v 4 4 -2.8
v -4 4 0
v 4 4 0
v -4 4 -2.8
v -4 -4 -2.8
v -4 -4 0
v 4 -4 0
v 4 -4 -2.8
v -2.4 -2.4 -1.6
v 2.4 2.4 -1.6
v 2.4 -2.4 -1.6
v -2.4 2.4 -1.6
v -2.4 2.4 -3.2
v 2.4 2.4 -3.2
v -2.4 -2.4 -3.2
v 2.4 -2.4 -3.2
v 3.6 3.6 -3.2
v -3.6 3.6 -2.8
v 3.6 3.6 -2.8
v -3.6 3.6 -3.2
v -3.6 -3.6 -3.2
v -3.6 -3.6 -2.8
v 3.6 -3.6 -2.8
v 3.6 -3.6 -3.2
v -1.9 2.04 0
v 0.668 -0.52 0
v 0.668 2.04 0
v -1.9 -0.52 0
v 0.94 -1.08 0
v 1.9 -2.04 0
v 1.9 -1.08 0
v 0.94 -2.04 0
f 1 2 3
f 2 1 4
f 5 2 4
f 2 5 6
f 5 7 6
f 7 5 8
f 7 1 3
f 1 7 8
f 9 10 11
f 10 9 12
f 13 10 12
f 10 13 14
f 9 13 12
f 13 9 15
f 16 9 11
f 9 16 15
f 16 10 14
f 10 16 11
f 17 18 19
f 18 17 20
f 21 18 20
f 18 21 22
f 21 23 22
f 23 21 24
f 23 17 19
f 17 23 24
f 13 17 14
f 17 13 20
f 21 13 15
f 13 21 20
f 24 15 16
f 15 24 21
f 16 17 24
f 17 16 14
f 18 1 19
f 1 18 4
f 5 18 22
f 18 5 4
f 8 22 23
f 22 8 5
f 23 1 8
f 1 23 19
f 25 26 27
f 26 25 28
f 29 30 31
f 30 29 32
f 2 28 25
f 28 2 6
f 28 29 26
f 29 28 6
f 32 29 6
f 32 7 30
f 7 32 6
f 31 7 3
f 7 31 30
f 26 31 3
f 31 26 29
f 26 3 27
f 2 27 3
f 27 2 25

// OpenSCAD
// file: ../p/box5.scad
use <../lib.scad>
function ldraw_lib__box5() = [
// 0 Box with 5 Faces and All Edges
// 0 Name: box5.dat
// 0 Author: James Jessiman
// 0 !LDRAW_ORG Primitive UPDATE 2012-01
// 0 !LICENSE Licensed under CC BY 2.0 and CC BY 4.0 : see CAreadme.txt
// 
// 0 BFC CERTIFY CCW
  [0,"BFC","CERTIFY"],
  [0,"BFC","CCW"],
// 
// 0 !HISTORY 2002-04-03 [sbliss] Modified for BFC compliance
// 0 !HISTORY 2002-04-25 [PTadmin] Official Update 2002-02
// 0 !HISTORY 2007-06-24 [PTadmin] Header formatted for Contributor Agreement
// 0 !HISTORY 2008-07-01 [PTadmin] Official Update 2008-01
// 0 !HISTORY 2012-02-16 [Philo] Changed to CCW
// 0 !HISTORY 2012-03-30 [PTadmin] Official Update 2012-01
// 
// 
// 2 24 1 1 1 -1 1 1
  [2,24,1,1,1,-1,1,1],
// 2 24 -1 1 1 -1 1 -1
  [2,24,-1,1,1,-1,1,-1],
// 2 24 -1 1 -1 1 1 -1
  [2,24,-1,1,-1,1,1,-1],
// 2 24 1 1 -1 1 1 1
  [2,24,1,1,-1,1,1,1],
// 2 24 1 0 1 -1 0 1
  [2,24,1,0,1,-1,0,1],
// 2 24 -1 0 1 -1 0 -1
  [2,24,-1,0,1,-1,0,-1],
// 2 24 -1 0 -1 1 0 -1
  [2,24,-1,0,-1,1,0,-1],
// 2 24 1 0 -1 1 0 1
  [2,24,1,0,-1,1,0,1],
// 2 24 1 0 1 1 1 1
  [2,24,1,0,1,1,1,1],
// 2 24 -1 0 1 -1 1 1
  [2,24,-1,0,1,-1,1,1],
// 2 24 1 0 -1 1 1 -1
  [2,24,1,0,-1,1,1,-1],
// 2 24 -1 0 -1 -1 1 -1
  [2,24,-1,0,-1,-1,1,-1],
// 4 16 -1 1 1 1 1 1 1 1 -1 -1 1 -1
  [4,16,-1,1,1,1,1,1,1,1,-1,-1,1,-1],
// 4 16 -1 1 1 -1 0 1 1 0 1 1 1 1
  [4,16,-1,1,1,-1,0,1,1,0,1,1,1,1],
// 4 16 -1 1 -1 -1 0 -1 -1 0 1 -1 1 1
  [4,16,-1,1,-1,-1,0,-1,-1,0,1,-1,1,1],
// 4 16 1 1 -1 1 0 -1 -1 0 -1 -1 1 -1
  [4,16,1,1,-1,1,0,-1,-1,0,-1,-1,1,-1],
// 4 16 1 1 1 1 0 1 1 0 -1 1 1 -1
  [4,16,1,1,1,1,0,1,1,0,-1,1,1,-1],
];
module ldraw_lib__box5(step=0, col=false, unit=2/5, alt=false, line=0.2, solid=!$preview)
    makepoly(ldraw_lib__box5(), step=step, col=col, unit=unit, alt=alt, line=line, solid=solid);
ldraw_lib__box5(line=0.2);
// file: ../p/box4.scad
use <../lib.scad>
function ldraw_lib__box4() = [
// 0 Box with 4 Faces (2 Parallel Pairs) and All Edges
// 0 Name: box4.dat
// 0 Author: James Jessiman
// 0 !LDRAW_ORG Primitive UPDATE 2012-01
// 0 !LICENSE Licensed under CC BY 2.0 and CC BY 4.0 : see CAreadme.txt
// 
// 0 BFC CERTIFY CCW
  [0,"BFC","CERTIFY"],
  [0,"BFC","CCW"],
// 
// 0 !HISTORY 2002-04-03 [sbliss] Modified for BFC compliance
// 0 !HISTORY 2002-04-25 [PTadmin] Official Update 2002-02
// 0 !HISTORY 2007-06-24 [PTadmin] Header formatted for Contributor Agreement
// 0 !HISTORY 2008-07-01 [PTadmin] Official Update 2008-01
// 0 !HISTORY 2012-02-16 [Philo] Changed to CCW
// 0 !HISTORY 2012-03-30 [PTadmin] Official Update 2012-01
// 
// 
// 2 24 1 1 1 -1 1 1
  [2,24,1,1,1,-1,1,1],
// 2 24 -1 1 1 -1 1 -1
  [2,24,-1,1,1,-1,1,-1],
// 2 24 -1 1 -1 1 1 -1
  [2,24,-1,1,-1,1,1,-1],
// 2 24 1 1 -1 1 1 1
  [2,24,1,1,-1,1,1,1],
// 2 24 1 0 1 -1 0 1
  [2,24,1,0,1,-1,0,1],
// 2 24 -1 0 1 -1 0 -1
  [2,24,-1,0,1,-1,0,-1],
// 2 24 -1 0 -1 1 0 -1
  [2,24,-1,0,-1,1,0,-1],
// 2 24 1 0 -1 1 0 1
  [2,24,1,0,-1,1,0,1],
// 2 24 1 0 1 1 1 1
  [2,24,1,0,1,1,1,1],
// 2 24 -1 0 1 -1 1 1
  [2,24,-1,0,1,-1,1,1],
// 2 24 1 0 -1 1 1 -1
  [2,24,1,0,-1,1,1,-1],
// 2 24 -1 0 -1 -1 1 -1
  [2,24,-1,0,-1,-1,1,-1],
// 4 16 -1 1 1 -1 0 1 1 0 1 1 1 1
  [4,16,-1,1,1,-1,0,1,1,0,1,1,1,1],
// 4 16 -1 1 -1 -1 0 -1 -1 0 1 -1 1 1
  [4,16,-1,1,-1,-1,0,-1,-1,0,1,-1,1,1],
// 4 16 1 1 -1 1 0 -1 -1 0 -1 -1 1 -1
  [4,16,1,1,-1,1,0,-1,-1,0,-1,-1,1,-1],
// 4 16 1 1 1 1 0 1 1 0 -1 1 1 -1
  [4,16,1,1,1,1,0,1,1,0,-1,1,1,-1],
];
module ldraw_lib__box4(step=0, col=false, unit=2/5, alt=false, line=0.2, solid=!$preview)
    makepoly(ldraw_lib__box4(), step=step, col=col, unit=unit, alt=alt, line=line, solid=solid);
ldraw_lib__box4(line=0.2);
// file: s/3070bs01.scad
use <../../lib.scad>
use <../../p/box4.scad>
use <../../p/box5.scad>
function ldraw_lib__s__3070bs01() = [
// 0 ~Tile  1 x  1 with Groove without Top Face
// 0 Name: s\3070bs01.dat
// 0 Author: Chris Dee [cwdee]
// 0 !LDRAW_ORG Subpart UPDATE 2009-02
// 0 !LICENSE Licensed under CC BY 2.0 and CC BY 4.0 : see CAreadme.txt
// 
// 0 BFC CERTIFY CCW
  [0,"BFC","CERTIFY"],
  [0,"BFC","CCW"],
// 
// 0 !HISTORY 2009-09-03 [PTadmin] Official Update 2009-02
// 
// 
// 1 16 0 0 0 10 0 0 0 7 0 0 0 10 box4.dat
  [1,16,0,0,0,10,0,0,0,7,0,0,0,10, ldraw_lib__box4()],
// 0 BFC INVERTNEXT
  [0,"BFC","INVERTNEXT"],
// 1 16 0 8 0 6 0 0 0 -4 0 0 0 6 box5.dat
  [1,16,0,8,0,6,0,0,0,-4,0,0,0,6, ldraw_lib__box5()],
// 1 16 0 7 0 9 0 0 0 1 0 0 0 9 box4.dat
  [1,16,0,7,0,9,0,0,0,1,0,0,0,9, ldraw_lib__box4()],
// 
// 4 16 9 8 9 6 8 6 -6 8 6 -9 8 9
  [4,16,9,8,9,6,8,6,-6,8,6,-9,8,9],
// 4 16 -9 8 9 -6 8 6 -6 8 -6 -9 8 -9
  [4,16,-9,8,9,-6,8,6,-6,8,-6,-9,8,-9],
// 4 16 -9 8 -9 -6 8 -6 6 8 -6 9 8 -9
  [4,16,-9,8,-9,-6,8,-6,6,8,-6,9,8,-9],
// 4 16 9 8 -9 6 8 -6 6 8 6 9 8 9
  [4,16,9,8,-9,6,8,-6,6,8,6,9,8,9],
// 
// 4 16 10 7 10 9 7 9 -9 7 9 -10 7 10
  [4,16,10,7,10,9,7,9,-9,7,9,-10,7,10],
// 4 16 -10 7 10 -9 7 9 -9 7 -9 -10 7 -10
  [4,16,-10,7,10,-9,7,9,-9,7,-9,-10,7,-10],
// 4 16 -10 7 -10 -9 7 -9 9 7 -9 10 7 -10
  [4,16,-10,7,-10,-9,7,-9,9,7,-9,10,7,-10],
// 4 16 10 7 -10 9 7 -9 9 7 9 10 7 10
  [4,16,10,7,-10,9,7,-9,9,7,9,10,7,10],
// 0
];
module ldraw_lib__s__3070bs01(step=0, col=false, unit=2/5, alt=false, line=0.2, solid=!$preview)
    makepoly(ldraw_lib__s__3070bs01(), step=step, col=col, unit=unit, alt=alt, line=line, solid=solid);
ldraw_lib__s__3070bs01(line=0.2);
// main file
use <../lib.scad>
use <s/3070bs01.scad>
function ldraw_lib__3070bpz0() = [
// 0 Tile  1 x  1 with Two White Squares Pattern
// 0 Name: 3070bpz0.dat
// 0 Author: Vincent Messenet [Cheenzo]
// 0 !LDRAW_ORG Part UPDATE 2019-02
// 0 !LICENSE Licensed under CC BY 2.0 and CC BY 4.0 : see CAreadme.txt
// 
// 0 BFC CERTIFY CCW
  [0,"BFC","CERTIFY"],
  [0,"BFC","CCW"],
// 
// 0 !KEYWORDS Brickheadz, BrickLink 3070bpb126, Minecraft, Set 41612
// 
// 0 !HISTORY 2019-09-09 [PTadmin] Official Update 2019-02
// 
// 
// 1 16 0 0 0 1 0 0 0 1 0 0 0 1 s\3070bs01.dat
  [1,16,0,0,0,1,0,0,0,1,0,0,0,1, ldraw_lib__s__3070bs01()],
// 
// 4 15 -4.75 0 5.1 -4.75 0 -1.3 1.67 0 -1.3 1.67 0 5.1
  [4,15,-4.75,0,5.1,-4.75,0,-1.3,1.67,0,-1.3,1.67,0,5.1],
// 4 15 2.35 0 -2.7 2.35 0 -5.1 4.75 0 -5.1 4.75 0 -2.7
  [4,15,2.35,0,-2.7,2.35,0,-5.1,4.75,0,-5.1,4.75,0,-2.7],
// 
// 4 16 -4.75 0 -1.3 -4.75 0 5.1 -10 0 10 -10 0 -10
  [4,16,-4.75,0,-1.3,-4.75,0,5.1,-10,0,10,-10,0,-10],
// 4 16 1.67 0 -1.3 -4.75 0 -1.3 -10 0 -10 2.35 0 -2.7
  [4,16,1.67,0,-1.3,-4.75,0,-1.3,-10,0,-10,2.35,0,-2.7],
// 3 16 2.35 0 -5.1 2.35 0 -2.7 -10 0 -10
  [3,16,2.35,0,-5.1,2.35,0,-2.7,-10,0,-10],
// 4 16 4.75 0 -5.1 2.35 0 -5.1 -10 0 -10 10 0 -10
  [4,16,4.75,0,-5.1,2.35,0,-5.1,-10,0,-10,10,0,-10],
// 4 16 4.75 0 -2.7 4.75 0 -5.1 10 0 -10 10 0 10
  [4,16,4.75,0,-2.7,4.75,0,-5.1,10,0,-10,10,0,10],
// 4 16 2.35 0 -2.7 4.75 0 -2.7 10 0 10 1.67 0 -1.3
  [4,16,2.35,0,-2.7,4.75,0,-2.7,10,0,10,1.67,0,-1.3],
// 3 16 1.67 0 -1.3 10 0 10 1.67 0 5.1
  [3,16,1.67,0,-1.3,10,0,10,1.67,0,5.1],
// 4 16 -4.75 0 5.1 1.67 0 5.1 10 0 10 -10 0 10
  [4,16,-4.75,0,5.1,1.67,0,5.1,10,0,10,-10,0,10],
];
module ldraw_lib__3070bpz0(step=0, col=false, unit=2/5, alt=false, line=0.2, solid=!$preview)
    makepoly(ldraw_lib__3070bpz0(), step=step, col=col, unit=unit, alt=alt, line=line, solid=solid);
ldraw_lib__3070bpz0(line=0.2);
